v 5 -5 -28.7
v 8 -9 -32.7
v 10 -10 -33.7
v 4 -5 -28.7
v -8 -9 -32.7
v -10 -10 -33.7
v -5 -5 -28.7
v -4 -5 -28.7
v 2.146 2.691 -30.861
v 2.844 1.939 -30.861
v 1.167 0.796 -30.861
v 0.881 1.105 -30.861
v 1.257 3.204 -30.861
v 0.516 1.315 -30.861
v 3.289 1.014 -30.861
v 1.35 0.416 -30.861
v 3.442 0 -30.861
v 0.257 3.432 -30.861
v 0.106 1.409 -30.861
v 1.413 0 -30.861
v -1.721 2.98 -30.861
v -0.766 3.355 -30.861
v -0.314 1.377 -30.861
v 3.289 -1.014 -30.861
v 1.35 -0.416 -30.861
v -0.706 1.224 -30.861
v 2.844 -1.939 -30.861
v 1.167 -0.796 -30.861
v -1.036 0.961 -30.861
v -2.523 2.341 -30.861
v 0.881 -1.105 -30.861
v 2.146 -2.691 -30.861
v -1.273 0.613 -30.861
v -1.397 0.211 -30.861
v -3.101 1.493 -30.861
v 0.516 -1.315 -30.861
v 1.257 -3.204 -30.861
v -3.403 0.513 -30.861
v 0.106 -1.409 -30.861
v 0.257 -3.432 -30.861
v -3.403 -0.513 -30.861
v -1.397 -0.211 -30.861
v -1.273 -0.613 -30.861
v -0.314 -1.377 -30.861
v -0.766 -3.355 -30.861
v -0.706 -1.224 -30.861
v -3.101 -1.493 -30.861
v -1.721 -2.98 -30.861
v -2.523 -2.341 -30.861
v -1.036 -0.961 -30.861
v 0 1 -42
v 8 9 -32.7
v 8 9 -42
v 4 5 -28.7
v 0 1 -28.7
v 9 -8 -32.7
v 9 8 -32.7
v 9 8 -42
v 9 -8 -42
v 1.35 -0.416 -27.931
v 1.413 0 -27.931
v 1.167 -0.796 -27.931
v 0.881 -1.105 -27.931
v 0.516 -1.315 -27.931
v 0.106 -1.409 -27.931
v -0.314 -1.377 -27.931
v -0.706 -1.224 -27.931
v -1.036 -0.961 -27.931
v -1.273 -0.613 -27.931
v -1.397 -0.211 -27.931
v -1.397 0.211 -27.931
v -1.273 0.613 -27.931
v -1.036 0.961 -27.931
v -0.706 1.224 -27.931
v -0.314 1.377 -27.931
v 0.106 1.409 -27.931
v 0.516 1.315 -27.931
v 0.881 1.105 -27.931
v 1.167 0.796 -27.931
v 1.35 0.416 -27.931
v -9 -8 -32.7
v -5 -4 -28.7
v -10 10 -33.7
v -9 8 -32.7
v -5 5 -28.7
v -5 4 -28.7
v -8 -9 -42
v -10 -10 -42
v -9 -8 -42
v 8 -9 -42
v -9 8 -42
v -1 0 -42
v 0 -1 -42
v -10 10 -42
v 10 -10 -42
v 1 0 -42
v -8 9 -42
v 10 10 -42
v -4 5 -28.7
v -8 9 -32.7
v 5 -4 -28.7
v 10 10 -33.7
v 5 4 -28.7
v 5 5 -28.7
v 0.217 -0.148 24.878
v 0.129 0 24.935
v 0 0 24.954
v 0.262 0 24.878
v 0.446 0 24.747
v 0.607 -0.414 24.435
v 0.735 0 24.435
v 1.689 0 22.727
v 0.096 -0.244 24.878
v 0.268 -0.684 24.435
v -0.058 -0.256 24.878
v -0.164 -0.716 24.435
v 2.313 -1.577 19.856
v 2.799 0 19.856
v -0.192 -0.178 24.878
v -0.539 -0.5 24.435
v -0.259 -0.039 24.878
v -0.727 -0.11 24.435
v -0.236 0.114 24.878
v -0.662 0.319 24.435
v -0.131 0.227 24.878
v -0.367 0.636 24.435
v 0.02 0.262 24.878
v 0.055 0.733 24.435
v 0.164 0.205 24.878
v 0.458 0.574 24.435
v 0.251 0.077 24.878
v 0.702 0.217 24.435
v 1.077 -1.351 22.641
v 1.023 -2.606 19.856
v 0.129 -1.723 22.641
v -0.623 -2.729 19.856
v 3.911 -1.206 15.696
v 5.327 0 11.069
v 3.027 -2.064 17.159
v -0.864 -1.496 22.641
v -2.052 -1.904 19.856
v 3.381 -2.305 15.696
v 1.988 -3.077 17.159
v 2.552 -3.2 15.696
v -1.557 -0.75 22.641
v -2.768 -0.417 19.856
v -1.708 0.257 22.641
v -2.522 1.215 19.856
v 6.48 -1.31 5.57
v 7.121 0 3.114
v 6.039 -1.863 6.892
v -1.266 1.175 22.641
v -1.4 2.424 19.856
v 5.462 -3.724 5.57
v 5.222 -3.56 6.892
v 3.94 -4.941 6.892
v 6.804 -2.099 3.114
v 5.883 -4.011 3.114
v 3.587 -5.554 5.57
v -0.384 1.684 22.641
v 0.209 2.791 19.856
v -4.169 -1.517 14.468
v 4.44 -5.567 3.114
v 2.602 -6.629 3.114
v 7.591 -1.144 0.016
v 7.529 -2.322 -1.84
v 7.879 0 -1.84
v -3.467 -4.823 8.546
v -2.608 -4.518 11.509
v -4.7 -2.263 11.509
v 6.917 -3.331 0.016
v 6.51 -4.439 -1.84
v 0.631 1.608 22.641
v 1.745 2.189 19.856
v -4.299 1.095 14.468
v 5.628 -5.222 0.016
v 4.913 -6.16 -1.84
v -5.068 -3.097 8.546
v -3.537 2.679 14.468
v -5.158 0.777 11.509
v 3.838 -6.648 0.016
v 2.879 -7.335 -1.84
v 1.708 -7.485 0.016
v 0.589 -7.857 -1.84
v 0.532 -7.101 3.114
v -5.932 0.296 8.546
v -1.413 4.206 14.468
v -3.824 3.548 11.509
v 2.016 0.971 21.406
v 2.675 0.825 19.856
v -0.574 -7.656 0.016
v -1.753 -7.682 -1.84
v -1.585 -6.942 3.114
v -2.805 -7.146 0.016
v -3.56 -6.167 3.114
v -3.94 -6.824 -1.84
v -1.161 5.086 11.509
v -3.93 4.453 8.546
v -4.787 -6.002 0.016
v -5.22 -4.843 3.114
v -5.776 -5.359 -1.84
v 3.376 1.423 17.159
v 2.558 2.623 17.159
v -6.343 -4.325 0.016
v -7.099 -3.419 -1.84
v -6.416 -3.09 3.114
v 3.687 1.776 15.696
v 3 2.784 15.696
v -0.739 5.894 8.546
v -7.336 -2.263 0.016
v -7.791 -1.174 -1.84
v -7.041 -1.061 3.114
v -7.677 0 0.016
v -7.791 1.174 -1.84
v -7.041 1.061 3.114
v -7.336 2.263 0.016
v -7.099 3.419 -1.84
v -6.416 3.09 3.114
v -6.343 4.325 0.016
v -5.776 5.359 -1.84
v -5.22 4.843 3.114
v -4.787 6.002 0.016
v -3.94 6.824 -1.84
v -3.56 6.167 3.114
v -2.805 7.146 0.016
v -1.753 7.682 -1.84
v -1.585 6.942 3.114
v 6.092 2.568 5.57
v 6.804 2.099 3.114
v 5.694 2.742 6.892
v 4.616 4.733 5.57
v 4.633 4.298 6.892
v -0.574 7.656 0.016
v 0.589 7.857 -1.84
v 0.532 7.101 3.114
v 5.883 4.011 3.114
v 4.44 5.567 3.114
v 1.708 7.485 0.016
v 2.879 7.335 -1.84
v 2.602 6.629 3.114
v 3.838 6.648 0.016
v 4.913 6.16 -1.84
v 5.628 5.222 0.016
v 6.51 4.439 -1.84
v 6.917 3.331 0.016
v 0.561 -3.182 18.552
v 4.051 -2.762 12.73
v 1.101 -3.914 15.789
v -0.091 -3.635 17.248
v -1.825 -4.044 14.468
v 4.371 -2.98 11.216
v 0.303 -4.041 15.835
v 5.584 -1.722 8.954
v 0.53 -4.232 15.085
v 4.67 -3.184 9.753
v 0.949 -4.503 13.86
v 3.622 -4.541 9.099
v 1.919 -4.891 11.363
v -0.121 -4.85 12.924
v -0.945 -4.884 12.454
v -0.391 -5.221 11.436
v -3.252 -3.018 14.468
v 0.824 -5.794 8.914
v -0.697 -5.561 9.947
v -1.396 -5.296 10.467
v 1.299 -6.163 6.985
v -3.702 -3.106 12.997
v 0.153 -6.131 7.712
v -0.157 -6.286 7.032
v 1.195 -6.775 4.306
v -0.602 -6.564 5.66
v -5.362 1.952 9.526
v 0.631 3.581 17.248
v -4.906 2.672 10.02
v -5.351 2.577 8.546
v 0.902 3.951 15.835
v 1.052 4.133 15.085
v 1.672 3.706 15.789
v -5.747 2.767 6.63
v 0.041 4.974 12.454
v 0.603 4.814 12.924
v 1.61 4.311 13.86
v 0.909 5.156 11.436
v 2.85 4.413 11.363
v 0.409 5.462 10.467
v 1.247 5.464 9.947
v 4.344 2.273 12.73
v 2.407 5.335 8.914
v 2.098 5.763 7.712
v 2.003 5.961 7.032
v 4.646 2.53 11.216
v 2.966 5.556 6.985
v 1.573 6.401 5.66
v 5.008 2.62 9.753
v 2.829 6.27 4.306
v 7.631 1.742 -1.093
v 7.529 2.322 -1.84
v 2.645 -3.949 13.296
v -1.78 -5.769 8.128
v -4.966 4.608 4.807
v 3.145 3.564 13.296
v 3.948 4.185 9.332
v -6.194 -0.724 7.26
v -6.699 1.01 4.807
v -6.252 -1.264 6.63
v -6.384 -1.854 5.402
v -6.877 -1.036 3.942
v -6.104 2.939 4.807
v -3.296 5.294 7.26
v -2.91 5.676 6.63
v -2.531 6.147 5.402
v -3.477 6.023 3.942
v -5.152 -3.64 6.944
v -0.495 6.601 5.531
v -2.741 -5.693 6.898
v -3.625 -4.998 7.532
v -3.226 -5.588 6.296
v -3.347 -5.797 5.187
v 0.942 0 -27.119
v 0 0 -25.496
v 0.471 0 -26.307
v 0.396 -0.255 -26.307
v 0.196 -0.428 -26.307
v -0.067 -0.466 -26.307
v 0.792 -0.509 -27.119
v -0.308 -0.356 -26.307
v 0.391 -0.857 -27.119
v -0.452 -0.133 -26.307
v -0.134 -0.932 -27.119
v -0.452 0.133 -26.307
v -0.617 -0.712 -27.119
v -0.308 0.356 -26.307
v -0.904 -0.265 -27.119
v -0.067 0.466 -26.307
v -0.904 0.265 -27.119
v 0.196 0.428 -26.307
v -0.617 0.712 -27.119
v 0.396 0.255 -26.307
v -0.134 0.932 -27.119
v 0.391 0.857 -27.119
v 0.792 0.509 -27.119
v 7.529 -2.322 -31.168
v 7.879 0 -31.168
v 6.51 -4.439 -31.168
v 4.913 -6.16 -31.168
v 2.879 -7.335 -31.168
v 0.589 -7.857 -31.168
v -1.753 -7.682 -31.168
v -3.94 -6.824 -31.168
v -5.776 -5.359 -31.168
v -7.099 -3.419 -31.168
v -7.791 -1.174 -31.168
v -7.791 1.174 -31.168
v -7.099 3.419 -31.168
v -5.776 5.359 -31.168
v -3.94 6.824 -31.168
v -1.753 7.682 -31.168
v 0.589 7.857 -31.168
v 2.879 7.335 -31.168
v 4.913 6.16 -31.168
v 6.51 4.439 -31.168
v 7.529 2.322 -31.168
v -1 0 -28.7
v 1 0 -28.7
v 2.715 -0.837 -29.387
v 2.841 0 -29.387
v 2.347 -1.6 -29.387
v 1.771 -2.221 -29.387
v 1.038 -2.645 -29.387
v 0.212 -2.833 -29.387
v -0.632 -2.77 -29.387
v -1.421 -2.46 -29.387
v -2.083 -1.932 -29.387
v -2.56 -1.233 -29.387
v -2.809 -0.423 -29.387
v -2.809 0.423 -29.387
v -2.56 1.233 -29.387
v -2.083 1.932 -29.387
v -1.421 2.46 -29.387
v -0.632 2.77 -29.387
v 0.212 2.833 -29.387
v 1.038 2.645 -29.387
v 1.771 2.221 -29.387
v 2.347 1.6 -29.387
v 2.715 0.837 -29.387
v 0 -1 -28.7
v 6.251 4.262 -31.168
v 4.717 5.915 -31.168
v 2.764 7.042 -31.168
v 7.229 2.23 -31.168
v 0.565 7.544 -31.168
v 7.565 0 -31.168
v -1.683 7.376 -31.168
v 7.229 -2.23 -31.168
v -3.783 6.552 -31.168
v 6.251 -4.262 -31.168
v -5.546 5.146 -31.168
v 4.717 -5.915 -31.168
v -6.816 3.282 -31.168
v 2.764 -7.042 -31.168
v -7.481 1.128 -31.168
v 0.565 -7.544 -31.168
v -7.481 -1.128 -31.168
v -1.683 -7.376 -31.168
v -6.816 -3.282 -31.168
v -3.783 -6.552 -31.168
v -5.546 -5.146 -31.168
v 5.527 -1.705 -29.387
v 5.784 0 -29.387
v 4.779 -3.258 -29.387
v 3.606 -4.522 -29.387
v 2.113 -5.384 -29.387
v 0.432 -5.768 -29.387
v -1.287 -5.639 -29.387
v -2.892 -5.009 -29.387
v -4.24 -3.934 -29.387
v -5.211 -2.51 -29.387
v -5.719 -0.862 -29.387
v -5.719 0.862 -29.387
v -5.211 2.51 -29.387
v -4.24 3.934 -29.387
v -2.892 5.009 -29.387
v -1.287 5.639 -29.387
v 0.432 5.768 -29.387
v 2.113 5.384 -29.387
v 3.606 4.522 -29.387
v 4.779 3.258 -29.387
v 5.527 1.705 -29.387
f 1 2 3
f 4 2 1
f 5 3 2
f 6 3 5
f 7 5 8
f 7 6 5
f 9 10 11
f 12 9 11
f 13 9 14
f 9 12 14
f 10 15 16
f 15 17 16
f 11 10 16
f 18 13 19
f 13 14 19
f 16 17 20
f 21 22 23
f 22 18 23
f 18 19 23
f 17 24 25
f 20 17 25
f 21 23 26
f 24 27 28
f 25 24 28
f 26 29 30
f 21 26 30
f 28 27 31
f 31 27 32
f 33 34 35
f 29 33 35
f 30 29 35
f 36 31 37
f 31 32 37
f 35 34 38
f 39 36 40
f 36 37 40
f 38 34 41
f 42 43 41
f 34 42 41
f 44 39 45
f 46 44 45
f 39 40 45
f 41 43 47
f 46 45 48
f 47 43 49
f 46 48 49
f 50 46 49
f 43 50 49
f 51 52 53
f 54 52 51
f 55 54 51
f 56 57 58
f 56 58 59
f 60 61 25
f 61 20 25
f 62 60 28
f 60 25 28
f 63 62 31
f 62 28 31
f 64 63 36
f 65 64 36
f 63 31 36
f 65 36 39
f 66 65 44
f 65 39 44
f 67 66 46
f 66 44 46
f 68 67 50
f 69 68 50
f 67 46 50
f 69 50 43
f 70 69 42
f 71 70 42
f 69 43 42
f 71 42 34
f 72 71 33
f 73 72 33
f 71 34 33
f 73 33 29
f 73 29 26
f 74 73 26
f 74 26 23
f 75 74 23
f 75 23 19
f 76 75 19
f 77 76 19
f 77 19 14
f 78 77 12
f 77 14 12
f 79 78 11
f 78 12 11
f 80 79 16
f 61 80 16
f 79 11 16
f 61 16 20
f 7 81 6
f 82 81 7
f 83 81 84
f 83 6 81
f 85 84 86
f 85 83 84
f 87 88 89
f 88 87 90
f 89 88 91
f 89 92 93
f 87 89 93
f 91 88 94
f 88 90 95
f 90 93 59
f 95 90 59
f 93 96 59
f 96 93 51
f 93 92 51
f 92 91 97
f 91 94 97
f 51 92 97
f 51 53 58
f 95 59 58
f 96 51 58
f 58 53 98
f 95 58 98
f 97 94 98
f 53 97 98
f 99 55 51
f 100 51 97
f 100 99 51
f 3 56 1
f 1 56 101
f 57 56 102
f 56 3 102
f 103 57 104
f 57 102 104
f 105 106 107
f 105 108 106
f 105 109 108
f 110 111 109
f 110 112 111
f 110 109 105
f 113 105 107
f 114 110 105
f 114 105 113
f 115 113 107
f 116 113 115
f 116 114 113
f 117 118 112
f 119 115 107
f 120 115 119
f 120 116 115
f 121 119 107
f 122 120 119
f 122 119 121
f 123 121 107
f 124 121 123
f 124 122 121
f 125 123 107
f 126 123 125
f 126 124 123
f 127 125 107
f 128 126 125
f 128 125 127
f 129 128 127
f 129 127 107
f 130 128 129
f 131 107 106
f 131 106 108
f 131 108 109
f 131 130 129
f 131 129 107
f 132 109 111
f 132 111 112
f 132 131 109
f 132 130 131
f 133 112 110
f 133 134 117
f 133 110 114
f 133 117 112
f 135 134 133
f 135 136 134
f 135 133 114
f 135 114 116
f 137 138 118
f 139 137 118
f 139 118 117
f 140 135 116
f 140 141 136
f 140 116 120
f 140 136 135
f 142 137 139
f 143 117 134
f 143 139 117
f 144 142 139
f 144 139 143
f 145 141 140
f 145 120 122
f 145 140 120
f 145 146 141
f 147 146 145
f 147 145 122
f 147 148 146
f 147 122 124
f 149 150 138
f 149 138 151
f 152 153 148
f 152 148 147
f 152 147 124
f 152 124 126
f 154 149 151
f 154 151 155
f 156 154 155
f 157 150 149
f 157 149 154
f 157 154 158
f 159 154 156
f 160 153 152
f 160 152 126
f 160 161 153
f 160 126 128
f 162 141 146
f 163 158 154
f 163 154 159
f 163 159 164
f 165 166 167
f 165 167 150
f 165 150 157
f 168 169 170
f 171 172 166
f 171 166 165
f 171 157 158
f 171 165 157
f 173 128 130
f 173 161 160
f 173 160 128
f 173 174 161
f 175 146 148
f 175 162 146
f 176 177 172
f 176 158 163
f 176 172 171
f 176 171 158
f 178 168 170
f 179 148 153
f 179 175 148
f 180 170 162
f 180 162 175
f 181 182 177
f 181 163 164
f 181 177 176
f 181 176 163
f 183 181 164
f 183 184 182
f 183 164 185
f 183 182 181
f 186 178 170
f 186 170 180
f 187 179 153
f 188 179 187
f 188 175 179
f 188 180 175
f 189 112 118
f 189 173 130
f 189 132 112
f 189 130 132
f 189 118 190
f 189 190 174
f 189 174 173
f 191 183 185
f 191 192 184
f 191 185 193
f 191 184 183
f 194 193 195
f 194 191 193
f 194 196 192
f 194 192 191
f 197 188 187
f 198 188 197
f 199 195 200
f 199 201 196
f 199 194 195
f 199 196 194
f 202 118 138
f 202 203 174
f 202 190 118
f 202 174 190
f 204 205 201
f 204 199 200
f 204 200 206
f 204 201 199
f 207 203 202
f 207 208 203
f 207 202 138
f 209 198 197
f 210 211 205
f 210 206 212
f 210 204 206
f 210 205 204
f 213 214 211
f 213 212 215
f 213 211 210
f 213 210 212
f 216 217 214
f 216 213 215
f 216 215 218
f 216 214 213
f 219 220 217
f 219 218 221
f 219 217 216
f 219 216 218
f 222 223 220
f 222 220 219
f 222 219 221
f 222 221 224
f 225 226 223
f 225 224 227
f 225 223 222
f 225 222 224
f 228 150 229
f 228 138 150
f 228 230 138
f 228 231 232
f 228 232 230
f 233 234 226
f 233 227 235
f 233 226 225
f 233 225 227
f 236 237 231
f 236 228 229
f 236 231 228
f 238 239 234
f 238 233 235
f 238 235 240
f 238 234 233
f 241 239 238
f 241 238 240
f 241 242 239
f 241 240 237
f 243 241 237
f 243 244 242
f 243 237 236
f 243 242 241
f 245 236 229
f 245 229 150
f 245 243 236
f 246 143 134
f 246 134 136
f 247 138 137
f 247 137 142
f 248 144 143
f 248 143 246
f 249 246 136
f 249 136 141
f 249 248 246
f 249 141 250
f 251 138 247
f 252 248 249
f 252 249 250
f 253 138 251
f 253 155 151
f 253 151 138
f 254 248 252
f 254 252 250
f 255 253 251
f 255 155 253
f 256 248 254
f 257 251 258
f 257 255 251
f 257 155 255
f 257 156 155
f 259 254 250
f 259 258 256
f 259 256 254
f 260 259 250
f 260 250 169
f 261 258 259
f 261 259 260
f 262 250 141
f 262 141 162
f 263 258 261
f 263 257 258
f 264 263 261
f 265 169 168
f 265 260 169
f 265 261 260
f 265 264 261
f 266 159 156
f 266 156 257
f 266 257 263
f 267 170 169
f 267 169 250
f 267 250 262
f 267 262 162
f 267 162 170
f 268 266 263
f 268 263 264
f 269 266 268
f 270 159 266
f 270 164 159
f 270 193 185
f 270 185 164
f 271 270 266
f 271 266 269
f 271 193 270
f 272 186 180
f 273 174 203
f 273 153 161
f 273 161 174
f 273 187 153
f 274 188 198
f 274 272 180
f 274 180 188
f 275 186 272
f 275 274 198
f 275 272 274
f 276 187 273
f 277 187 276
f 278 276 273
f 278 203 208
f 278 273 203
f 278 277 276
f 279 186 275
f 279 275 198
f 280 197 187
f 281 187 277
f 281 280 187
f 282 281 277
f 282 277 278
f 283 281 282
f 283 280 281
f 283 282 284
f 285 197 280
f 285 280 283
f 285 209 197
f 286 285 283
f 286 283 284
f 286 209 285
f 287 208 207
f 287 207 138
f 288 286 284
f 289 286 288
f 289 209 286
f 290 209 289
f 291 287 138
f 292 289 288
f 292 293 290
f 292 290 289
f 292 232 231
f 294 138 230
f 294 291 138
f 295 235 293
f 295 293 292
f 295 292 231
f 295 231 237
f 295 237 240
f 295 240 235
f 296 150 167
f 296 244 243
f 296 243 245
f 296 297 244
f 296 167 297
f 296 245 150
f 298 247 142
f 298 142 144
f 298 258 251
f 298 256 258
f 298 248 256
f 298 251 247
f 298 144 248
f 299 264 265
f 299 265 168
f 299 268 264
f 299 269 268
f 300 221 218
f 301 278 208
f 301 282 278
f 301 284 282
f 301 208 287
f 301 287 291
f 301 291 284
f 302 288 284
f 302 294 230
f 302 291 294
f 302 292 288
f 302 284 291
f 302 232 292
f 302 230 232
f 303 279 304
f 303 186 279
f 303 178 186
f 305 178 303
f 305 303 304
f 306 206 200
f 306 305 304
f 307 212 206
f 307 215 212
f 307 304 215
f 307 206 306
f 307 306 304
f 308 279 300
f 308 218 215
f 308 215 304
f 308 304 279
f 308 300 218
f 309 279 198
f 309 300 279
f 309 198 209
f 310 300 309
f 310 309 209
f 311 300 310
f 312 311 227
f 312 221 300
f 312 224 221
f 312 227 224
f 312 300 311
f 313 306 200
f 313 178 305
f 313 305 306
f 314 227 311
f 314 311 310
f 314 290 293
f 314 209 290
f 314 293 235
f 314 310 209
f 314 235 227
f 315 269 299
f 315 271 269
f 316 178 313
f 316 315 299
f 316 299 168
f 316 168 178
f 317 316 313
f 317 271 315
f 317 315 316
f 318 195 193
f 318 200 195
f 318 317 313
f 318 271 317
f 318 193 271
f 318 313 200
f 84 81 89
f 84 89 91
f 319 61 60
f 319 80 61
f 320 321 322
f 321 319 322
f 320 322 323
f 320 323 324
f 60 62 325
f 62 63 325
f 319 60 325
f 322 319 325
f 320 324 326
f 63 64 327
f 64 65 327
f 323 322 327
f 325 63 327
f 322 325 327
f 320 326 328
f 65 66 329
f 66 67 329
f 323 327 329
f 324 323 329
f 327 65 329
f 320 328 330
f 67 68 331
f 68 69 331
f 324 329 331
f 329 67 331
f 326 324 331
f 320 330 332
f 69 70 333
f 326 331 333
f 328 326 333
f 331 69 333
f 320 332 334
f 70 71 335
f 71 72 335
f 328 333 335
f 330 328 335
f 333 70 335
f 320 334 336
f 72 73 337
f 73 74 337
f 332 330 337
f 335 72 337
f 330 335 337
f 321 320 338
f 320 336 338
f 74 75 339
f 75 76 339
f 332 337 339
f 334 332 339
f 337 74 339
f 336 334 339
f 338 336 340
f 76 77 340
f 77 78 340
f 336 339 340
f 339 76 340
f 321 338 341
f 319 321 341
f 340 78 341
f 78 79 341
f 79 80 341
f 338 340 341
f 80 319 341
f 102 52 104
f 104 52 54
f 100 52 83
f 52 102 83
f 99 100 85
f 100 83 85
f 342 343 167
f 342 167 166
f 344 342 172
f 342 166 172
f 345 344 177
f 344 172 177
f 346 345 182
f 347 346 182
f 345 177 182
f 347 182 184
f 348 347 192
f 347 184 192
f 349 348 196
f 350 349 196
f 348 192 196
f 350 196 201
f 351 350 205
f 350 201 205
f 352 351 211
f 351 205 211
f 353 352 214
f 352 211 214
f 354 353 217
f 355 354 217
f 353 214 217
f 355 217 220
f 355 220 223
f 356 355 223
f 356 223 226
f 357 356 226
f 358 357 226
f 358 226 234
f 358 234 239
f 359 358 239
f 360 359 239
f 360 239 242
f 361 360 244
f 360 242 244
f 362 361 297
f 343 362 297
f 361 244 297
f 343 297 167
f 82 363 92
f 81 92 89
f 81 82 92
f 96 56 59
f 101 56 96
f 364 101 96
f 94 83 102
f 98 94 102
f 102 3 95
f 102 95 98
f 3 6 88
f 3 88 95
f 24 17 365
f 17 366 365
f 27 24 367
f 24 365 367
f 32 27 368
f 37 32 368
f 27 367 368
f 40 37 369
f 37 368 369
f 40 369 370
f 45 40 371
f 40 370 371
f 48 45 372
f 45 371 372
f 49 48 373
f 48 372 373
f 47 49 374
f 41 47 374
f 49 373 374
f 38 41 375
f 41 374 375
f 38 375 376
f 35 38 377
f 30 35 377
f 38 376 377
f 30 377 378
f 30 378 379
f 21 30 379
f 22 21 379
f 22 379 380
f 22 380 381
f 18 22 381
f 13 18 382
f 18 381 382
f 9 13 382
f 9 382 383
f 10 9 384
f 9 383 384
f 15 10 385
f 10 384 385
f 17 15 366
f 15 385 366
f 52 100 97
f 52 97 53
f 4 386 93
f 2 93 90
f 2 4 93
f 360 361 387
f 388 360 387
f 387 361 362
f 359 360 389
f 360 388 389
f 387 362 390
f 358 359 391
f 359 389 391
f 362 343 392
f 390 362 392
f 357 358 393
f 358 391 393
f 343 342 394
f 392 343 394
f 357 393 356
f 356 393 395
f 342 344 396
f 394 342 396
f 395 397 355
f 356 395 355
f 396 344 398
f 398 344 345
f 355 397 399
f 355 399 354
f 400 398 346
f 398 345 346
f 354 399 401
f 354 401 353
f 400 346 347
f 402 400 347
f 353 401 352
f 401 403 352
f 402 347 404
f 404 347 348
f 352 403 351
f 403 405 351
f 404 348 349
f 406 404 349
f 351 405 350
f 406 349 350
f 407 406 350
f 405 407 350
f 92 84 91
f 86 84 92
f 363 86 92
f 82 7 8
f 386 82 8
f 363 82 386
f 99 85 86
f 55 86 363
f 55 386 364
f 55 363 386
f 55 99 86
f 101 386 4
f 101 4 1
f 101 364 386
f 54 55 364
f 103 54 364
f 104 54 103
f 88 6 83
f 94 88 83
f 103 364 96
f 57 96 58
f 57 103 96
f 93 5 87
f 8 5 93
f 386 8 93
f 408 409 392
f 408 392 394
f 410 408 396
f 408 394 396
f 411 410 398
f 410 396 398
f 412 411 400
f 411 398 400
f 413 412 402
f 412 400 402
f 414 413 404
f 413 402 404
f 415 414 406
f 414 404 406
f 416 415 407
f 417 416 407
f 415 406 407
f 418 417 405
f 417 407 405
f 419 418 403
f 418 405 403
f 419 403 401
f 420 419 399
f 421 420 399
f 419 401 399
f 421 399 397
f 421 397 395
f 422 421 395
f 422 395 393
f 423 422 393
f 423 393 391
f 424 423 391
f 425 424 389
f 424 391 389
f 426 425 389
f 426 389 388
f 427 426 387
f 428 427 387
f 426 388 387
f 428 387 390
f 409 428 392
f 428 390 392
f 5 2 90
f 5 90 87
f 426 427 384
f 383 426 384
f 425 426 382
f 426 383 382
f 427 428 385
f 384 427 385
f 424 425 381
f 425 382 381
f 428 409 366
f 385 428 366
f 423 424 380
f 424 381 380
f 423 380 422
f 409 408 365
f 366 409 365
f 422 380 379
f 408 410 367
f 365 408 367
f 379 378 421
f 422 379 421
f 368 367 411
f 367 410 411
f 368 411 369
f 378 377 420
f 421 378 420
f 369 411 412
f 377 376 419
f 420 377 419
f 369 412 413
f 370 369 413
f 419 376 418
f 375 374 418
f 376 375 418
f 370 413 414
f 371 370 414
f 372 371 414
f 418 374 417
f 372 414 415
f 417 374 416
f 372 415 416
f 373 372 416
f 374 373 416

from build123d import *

# Parameters (mm, degrees)
F3_START    = -28.7
F2_W        = 20
F2_H        = 20
F3_DEPTH    = 13.3
F4_T1_DEPTH = 45.7168298797
F4_T3_DEPTH = 45.7168298797


# Not quite as in the source:
# - a fillet or chamfer that OpenCascade refuses, or shapes differently, is made with other operations: its cross-section is extruded or revolved along the edge and cut away or added


with BuildPart() as f1:
    # F0 (on Front) → F1 (revolve)
    with BuildSketch(Plane.XZ):
        with BuildLine():
            Line((2.8410700233, -29.3871536851), (5.784040158, -29.3871536851))
            Line((5.784040158, -29.3871536851), (7.5652169337, -31.1683304608))
            Line((7.5652169337, -31.1683304608), (7.879216224, -31.1683304608))
            Line((7.879216224, -31.1683304608), (7.879216224, -1.8401825801))
            add(Edge.make_bspline(
                [(0, 24.9539222568), (2.5612364989, 24.9539222568), (7.879216224, 1.3124344186), (7.879216224, -1.8401825801)],
                knots=[0, 0, 0, 0, 27.9285893363, 27.9285893363, 27.9285893363, 27.9285893363], degree=3))
            Line((0, 24.9539222568), (0, 0))
            Line((0, 0), (0, -25.4955813289))
            Line((0, -25.4955813289), (1.4129093615, -27.9308501631))
            Line((1.4129093615, -27.9308501631), (1.4129093615, -30.8610778302))
            Line((1.4129093615, -30.8610778302), (3.4415575342, -30.8610778302))
            Line((3.4415575342, -30.8610778302), (2.8410700233, -29.3871536851))
        make_face()
    revolve(axis=Axis((0, 0, 12.4769611284), (0, 0, -1)))


with BuildPart() as f3:
    # F2 (on Top) → F3 (new body)
    with BuildSketch(Plane.XY.offset(F3_START)):
        Rectangle(F2_W, F2_H)
        Polygon((-1, 0), (-8.9999996126, -7.9999996126), (-8.9999996126, 7.9999996126), align=None, mode=Mode.SUBTRACT)
        Polygon((0, -1), (7.9999996126, -8.9999996126), (-7.9999996126, -8.9999996126), align=None, mode=Mode.SUBTRACT)
        Polygon((-7.9999996126, 8.9999996126), (7.9999996126, 8.9999996126), (0, 1), align=None, mode=Mode.SUBTRACT)
        Polygon((8.9999996126, 7.9999996126), (8.9999996126, -7.9999996126), (1, 0), align=None, mode=Mode.SUBTRACT)
    extrude(amount=-F3_DEPTH)

    # F4: chamfer of 5 on 4 edges, made by hand

    # F4_s2 → F4_t1 (cut)
    with BuildSketch(Plane.XZ.offset(-22.8584149398)):
        Polygon((10, -33.7), (5, -28.7), (10, -28.7), align=None)
        Polygon((-10, -33.7), (-5, -28.7), (-10, -28.7), align=None)
    extrude(amount=F4_T1_DEPTH, mode=Mode.SUBTRACT)

    # F4_s4 → F4_t3 (cut)
    with BuildSketch(Plane.YZ.offset(-22.8584149398)):
        Polygon((10, -33.7), (5, -28.7), (10, -28.7), align=None)
        Polygon((-10, -33.7), (-5, -28.7), (-10, -28.7), align=None)
    extrude(amount=F4_T3_DEPTH, mode=Mode.SUBTRACT)


solid = Compound([f1.part, f3.part])
